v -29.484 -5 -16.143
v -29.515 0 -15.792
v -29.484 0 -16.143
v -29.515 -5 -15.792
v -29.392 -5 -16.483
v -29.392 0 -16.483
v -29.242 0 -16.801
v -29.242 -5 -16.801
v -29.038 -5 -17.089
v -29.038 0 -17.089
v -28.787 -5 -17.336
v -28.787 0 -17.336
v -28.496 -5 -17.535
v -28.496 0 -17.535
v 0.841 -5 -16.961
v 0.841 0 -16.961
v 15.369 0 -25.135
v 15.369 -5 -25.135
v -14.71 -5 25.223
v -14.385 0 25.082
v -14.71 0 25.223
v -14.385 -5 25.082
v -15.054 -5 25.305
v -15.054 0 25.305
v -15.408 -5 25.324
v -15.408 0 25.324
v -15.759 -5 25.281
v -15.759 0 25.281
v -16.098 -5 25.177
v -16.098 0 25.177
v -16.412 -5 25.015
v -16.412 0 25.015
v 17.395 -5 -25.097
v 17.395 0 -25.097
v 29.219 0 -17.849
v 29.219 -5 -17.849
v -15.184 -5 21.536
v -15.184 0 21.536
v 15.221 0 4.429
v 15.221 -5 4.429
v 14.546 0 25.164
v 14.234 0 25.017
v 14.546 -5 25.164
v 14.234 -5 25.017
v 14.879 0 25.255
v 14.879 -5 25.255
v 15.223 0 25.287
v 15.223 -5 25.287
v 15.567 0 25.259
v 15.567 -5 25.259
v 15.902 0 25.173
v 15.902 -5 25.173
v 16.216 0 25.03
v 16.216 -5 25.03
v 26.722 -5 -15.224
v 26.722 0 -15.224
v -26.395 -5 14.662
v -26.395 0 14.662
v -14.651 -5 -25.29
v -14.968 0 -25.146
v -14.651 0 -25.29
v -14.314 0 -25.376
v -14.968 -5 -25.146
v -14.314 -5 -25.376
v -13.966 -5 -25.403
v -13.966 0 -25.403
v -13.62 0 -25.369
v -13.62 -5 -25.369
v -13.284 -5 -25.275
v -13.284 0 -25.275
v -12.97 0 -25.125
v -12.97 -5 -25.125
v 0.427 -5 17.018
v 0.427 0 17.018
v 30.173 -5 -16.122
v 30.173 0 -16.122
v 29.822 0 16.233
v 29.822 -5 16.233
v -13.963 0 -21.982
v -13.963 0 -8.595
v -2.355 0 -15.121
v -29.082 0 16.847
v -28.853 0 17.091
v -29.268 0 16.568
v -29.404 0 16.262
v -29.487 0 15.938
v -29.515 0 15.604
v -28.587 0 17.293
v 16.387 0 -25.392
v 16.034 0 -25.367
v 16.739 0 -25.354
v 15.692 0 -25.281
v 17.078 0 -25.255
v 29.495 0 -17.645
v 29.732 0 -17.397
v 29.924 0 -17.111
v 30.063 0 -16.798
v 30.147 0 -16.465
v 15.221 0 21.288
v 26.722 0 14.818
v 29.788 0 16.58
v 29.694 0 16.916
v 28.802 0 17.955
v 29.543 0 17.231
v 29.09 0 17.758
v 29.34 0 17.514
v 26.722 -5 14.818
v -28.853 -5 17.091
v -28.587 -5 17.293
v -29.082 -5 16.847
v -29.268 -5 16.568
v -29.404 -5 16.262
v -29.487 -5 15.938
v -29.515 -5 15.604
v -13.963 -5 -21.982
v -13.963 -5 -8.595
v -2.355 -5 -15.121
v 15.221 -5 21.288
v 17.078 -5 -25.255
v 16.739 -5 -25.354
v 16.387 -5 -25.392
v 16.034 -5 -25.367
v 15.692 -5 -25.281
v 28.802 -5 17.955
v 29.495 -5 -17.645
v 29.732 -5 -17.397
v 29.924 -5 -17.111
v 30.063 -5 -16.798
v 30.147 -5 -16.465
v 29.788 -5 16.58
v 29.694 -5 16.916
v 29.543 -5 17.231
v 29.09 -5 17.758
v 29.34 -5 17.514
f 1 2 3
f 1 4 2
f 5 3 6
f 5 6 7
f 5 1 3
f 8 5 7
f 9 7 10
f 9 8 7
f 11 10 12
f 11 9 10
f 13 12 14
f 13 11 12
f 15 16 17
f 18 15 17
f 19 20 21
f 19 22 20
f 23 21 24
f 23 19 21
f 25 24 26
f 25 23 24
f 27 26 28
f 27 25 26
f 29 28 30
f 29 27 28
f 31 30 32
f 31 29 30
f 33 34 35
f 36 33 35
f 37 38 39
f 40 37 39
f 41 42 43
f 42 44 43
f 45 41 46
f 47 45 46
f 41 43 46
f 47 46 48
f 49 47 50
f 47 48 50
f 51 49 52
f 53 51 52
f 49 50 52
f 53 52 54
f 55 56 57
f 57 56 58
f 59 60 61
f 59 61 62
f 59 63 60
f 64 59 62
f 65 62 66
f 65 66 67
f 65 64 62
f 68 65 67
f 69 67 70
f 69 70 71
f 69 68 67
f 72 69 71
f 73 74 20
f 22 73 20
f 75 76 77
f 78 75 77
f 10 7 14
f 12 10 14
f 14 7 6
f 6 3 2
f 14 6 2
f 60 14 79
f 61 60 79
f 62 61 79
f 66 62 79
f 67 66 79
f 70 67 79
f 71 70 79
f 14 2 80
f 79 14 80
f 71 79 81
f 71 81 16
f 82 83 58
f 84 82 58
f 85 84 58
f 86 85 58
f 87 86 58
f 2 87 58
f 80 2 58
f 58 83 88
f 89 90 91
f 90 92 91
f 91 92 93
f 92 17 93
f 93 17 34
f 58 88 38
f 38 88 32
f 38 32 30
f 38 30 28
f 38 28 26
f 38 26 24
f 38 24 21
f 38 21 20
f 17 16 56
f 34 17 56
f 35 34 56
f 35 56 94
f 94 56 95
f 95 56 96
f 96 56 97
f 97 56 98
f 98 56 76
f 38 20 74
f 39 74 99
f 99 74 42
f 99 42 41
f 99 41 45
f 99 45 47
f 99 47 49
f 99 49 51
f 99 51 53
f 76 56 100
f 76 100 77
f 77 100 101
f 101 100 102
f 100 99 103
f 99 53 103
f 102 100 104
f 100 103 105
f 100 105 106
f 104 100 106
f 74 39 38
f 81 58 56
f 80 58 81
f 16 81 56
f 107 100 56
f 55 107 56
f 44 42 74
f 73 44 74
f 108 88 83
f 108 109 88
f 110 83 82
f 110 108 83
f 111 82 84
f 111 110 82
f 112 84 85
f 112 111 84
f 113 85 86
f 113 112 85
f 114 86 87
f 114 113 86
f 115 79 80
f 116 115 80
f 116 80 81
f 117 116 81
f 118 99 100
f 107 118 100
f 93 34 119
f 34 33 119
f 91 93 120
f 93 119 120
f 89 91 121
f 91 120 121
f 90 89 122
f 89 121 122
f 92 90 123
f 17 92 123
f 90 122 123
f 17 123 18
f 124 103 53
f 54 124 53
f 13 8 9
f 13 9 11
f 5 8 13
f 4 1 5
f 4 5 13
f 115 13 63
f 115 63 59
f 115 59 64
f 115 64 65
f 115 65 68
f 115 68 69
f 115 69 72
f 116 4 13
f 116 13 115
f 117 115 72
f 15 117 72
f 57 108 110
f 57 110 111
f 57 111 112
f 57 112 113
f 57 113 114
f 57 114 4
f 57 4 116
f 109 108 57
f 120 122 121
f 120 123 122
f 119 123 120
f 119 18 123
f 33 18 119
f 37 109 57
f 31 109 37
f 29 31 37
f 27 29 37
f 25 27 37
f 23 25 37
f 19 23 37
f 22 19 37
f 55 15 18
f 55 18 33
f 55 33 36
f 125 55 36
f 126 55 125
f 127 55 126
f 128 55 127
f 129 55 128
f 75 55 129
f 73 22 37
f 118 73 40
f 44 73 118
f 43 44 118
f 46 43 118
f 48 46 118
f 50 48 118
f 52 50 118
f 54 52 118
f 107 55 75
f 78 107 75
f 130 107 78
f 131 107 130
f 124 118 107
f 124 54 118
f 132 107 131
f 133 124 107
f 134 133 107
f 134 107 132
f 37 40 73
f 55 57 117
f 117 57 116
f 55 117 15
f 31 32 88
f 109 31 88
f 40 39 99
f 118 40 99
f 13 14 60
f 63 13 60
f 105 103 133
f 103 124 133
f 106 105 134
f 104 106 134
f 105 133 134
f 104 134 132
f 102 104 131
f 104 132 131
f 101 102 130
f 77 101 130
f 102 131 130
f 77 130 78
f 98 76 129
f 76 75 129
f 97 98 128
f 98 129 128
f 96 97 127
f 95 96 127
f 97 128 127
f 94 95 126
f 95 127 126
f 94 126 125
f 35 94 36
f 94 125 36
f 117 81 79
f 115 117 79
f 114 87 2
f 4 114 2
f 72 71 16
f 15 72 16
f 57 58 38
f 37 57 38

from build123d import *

# Parameters (mm, degrees)
F1_DEPTH = 5
F2_R     = 2


with BuildPart() as f1:
    # F0 (on Front) → F1 (new body)
    with BuildSketch(Plane.XZ):
        Polygon((15.221183, 25.589402), (0.426741, 17.017691), (-15.418572, 25.644877), (-29.515327, 16.704283), (-29.515327, -16.961344), (-13.963126, -25.711559), (0.841107, -16.961344), (16.393308, -25.711559), (30.185388, -17.256112), (29.809576, 17.388582), align=None)
        Polygon((-2.354774, -15.121066), (-13.963126, -21.982318), (-13.963126, -8.595468), align=None, mode=Mode.SUBTRACT)
        Polygon((15.221183, 4.428767), (15.221183, 21.288337), (26.722113, 14.817509), (26.722113, -15.223855), (-26.395499, 14.661982), (-15.183636, 21.535588), align=None, mode=Mode.SUBTRACT)
    extrude(amount=F1_DEPTH)

    # F2
    f2_edges = [f1.edges().sort_by_distance(p)[0] for p in [
        (15.221183, -2.5, 25.589402),
        (29.809576, -2.5, 17.388582),
        (30.185388, -2.5, -17.256112),
        (-15.418572, -2.5, 25.644877),
        (16.393308, -2.5, -25.711559),
        (-13.963126, -2.5, -25.711559),
        (-29.515327, -2.5, -16.961344),
        (-29.515327, -2.5, 16.704283),
    ]]
    fillet(f2_edges, radius=F2_R)


solid = f1.part
